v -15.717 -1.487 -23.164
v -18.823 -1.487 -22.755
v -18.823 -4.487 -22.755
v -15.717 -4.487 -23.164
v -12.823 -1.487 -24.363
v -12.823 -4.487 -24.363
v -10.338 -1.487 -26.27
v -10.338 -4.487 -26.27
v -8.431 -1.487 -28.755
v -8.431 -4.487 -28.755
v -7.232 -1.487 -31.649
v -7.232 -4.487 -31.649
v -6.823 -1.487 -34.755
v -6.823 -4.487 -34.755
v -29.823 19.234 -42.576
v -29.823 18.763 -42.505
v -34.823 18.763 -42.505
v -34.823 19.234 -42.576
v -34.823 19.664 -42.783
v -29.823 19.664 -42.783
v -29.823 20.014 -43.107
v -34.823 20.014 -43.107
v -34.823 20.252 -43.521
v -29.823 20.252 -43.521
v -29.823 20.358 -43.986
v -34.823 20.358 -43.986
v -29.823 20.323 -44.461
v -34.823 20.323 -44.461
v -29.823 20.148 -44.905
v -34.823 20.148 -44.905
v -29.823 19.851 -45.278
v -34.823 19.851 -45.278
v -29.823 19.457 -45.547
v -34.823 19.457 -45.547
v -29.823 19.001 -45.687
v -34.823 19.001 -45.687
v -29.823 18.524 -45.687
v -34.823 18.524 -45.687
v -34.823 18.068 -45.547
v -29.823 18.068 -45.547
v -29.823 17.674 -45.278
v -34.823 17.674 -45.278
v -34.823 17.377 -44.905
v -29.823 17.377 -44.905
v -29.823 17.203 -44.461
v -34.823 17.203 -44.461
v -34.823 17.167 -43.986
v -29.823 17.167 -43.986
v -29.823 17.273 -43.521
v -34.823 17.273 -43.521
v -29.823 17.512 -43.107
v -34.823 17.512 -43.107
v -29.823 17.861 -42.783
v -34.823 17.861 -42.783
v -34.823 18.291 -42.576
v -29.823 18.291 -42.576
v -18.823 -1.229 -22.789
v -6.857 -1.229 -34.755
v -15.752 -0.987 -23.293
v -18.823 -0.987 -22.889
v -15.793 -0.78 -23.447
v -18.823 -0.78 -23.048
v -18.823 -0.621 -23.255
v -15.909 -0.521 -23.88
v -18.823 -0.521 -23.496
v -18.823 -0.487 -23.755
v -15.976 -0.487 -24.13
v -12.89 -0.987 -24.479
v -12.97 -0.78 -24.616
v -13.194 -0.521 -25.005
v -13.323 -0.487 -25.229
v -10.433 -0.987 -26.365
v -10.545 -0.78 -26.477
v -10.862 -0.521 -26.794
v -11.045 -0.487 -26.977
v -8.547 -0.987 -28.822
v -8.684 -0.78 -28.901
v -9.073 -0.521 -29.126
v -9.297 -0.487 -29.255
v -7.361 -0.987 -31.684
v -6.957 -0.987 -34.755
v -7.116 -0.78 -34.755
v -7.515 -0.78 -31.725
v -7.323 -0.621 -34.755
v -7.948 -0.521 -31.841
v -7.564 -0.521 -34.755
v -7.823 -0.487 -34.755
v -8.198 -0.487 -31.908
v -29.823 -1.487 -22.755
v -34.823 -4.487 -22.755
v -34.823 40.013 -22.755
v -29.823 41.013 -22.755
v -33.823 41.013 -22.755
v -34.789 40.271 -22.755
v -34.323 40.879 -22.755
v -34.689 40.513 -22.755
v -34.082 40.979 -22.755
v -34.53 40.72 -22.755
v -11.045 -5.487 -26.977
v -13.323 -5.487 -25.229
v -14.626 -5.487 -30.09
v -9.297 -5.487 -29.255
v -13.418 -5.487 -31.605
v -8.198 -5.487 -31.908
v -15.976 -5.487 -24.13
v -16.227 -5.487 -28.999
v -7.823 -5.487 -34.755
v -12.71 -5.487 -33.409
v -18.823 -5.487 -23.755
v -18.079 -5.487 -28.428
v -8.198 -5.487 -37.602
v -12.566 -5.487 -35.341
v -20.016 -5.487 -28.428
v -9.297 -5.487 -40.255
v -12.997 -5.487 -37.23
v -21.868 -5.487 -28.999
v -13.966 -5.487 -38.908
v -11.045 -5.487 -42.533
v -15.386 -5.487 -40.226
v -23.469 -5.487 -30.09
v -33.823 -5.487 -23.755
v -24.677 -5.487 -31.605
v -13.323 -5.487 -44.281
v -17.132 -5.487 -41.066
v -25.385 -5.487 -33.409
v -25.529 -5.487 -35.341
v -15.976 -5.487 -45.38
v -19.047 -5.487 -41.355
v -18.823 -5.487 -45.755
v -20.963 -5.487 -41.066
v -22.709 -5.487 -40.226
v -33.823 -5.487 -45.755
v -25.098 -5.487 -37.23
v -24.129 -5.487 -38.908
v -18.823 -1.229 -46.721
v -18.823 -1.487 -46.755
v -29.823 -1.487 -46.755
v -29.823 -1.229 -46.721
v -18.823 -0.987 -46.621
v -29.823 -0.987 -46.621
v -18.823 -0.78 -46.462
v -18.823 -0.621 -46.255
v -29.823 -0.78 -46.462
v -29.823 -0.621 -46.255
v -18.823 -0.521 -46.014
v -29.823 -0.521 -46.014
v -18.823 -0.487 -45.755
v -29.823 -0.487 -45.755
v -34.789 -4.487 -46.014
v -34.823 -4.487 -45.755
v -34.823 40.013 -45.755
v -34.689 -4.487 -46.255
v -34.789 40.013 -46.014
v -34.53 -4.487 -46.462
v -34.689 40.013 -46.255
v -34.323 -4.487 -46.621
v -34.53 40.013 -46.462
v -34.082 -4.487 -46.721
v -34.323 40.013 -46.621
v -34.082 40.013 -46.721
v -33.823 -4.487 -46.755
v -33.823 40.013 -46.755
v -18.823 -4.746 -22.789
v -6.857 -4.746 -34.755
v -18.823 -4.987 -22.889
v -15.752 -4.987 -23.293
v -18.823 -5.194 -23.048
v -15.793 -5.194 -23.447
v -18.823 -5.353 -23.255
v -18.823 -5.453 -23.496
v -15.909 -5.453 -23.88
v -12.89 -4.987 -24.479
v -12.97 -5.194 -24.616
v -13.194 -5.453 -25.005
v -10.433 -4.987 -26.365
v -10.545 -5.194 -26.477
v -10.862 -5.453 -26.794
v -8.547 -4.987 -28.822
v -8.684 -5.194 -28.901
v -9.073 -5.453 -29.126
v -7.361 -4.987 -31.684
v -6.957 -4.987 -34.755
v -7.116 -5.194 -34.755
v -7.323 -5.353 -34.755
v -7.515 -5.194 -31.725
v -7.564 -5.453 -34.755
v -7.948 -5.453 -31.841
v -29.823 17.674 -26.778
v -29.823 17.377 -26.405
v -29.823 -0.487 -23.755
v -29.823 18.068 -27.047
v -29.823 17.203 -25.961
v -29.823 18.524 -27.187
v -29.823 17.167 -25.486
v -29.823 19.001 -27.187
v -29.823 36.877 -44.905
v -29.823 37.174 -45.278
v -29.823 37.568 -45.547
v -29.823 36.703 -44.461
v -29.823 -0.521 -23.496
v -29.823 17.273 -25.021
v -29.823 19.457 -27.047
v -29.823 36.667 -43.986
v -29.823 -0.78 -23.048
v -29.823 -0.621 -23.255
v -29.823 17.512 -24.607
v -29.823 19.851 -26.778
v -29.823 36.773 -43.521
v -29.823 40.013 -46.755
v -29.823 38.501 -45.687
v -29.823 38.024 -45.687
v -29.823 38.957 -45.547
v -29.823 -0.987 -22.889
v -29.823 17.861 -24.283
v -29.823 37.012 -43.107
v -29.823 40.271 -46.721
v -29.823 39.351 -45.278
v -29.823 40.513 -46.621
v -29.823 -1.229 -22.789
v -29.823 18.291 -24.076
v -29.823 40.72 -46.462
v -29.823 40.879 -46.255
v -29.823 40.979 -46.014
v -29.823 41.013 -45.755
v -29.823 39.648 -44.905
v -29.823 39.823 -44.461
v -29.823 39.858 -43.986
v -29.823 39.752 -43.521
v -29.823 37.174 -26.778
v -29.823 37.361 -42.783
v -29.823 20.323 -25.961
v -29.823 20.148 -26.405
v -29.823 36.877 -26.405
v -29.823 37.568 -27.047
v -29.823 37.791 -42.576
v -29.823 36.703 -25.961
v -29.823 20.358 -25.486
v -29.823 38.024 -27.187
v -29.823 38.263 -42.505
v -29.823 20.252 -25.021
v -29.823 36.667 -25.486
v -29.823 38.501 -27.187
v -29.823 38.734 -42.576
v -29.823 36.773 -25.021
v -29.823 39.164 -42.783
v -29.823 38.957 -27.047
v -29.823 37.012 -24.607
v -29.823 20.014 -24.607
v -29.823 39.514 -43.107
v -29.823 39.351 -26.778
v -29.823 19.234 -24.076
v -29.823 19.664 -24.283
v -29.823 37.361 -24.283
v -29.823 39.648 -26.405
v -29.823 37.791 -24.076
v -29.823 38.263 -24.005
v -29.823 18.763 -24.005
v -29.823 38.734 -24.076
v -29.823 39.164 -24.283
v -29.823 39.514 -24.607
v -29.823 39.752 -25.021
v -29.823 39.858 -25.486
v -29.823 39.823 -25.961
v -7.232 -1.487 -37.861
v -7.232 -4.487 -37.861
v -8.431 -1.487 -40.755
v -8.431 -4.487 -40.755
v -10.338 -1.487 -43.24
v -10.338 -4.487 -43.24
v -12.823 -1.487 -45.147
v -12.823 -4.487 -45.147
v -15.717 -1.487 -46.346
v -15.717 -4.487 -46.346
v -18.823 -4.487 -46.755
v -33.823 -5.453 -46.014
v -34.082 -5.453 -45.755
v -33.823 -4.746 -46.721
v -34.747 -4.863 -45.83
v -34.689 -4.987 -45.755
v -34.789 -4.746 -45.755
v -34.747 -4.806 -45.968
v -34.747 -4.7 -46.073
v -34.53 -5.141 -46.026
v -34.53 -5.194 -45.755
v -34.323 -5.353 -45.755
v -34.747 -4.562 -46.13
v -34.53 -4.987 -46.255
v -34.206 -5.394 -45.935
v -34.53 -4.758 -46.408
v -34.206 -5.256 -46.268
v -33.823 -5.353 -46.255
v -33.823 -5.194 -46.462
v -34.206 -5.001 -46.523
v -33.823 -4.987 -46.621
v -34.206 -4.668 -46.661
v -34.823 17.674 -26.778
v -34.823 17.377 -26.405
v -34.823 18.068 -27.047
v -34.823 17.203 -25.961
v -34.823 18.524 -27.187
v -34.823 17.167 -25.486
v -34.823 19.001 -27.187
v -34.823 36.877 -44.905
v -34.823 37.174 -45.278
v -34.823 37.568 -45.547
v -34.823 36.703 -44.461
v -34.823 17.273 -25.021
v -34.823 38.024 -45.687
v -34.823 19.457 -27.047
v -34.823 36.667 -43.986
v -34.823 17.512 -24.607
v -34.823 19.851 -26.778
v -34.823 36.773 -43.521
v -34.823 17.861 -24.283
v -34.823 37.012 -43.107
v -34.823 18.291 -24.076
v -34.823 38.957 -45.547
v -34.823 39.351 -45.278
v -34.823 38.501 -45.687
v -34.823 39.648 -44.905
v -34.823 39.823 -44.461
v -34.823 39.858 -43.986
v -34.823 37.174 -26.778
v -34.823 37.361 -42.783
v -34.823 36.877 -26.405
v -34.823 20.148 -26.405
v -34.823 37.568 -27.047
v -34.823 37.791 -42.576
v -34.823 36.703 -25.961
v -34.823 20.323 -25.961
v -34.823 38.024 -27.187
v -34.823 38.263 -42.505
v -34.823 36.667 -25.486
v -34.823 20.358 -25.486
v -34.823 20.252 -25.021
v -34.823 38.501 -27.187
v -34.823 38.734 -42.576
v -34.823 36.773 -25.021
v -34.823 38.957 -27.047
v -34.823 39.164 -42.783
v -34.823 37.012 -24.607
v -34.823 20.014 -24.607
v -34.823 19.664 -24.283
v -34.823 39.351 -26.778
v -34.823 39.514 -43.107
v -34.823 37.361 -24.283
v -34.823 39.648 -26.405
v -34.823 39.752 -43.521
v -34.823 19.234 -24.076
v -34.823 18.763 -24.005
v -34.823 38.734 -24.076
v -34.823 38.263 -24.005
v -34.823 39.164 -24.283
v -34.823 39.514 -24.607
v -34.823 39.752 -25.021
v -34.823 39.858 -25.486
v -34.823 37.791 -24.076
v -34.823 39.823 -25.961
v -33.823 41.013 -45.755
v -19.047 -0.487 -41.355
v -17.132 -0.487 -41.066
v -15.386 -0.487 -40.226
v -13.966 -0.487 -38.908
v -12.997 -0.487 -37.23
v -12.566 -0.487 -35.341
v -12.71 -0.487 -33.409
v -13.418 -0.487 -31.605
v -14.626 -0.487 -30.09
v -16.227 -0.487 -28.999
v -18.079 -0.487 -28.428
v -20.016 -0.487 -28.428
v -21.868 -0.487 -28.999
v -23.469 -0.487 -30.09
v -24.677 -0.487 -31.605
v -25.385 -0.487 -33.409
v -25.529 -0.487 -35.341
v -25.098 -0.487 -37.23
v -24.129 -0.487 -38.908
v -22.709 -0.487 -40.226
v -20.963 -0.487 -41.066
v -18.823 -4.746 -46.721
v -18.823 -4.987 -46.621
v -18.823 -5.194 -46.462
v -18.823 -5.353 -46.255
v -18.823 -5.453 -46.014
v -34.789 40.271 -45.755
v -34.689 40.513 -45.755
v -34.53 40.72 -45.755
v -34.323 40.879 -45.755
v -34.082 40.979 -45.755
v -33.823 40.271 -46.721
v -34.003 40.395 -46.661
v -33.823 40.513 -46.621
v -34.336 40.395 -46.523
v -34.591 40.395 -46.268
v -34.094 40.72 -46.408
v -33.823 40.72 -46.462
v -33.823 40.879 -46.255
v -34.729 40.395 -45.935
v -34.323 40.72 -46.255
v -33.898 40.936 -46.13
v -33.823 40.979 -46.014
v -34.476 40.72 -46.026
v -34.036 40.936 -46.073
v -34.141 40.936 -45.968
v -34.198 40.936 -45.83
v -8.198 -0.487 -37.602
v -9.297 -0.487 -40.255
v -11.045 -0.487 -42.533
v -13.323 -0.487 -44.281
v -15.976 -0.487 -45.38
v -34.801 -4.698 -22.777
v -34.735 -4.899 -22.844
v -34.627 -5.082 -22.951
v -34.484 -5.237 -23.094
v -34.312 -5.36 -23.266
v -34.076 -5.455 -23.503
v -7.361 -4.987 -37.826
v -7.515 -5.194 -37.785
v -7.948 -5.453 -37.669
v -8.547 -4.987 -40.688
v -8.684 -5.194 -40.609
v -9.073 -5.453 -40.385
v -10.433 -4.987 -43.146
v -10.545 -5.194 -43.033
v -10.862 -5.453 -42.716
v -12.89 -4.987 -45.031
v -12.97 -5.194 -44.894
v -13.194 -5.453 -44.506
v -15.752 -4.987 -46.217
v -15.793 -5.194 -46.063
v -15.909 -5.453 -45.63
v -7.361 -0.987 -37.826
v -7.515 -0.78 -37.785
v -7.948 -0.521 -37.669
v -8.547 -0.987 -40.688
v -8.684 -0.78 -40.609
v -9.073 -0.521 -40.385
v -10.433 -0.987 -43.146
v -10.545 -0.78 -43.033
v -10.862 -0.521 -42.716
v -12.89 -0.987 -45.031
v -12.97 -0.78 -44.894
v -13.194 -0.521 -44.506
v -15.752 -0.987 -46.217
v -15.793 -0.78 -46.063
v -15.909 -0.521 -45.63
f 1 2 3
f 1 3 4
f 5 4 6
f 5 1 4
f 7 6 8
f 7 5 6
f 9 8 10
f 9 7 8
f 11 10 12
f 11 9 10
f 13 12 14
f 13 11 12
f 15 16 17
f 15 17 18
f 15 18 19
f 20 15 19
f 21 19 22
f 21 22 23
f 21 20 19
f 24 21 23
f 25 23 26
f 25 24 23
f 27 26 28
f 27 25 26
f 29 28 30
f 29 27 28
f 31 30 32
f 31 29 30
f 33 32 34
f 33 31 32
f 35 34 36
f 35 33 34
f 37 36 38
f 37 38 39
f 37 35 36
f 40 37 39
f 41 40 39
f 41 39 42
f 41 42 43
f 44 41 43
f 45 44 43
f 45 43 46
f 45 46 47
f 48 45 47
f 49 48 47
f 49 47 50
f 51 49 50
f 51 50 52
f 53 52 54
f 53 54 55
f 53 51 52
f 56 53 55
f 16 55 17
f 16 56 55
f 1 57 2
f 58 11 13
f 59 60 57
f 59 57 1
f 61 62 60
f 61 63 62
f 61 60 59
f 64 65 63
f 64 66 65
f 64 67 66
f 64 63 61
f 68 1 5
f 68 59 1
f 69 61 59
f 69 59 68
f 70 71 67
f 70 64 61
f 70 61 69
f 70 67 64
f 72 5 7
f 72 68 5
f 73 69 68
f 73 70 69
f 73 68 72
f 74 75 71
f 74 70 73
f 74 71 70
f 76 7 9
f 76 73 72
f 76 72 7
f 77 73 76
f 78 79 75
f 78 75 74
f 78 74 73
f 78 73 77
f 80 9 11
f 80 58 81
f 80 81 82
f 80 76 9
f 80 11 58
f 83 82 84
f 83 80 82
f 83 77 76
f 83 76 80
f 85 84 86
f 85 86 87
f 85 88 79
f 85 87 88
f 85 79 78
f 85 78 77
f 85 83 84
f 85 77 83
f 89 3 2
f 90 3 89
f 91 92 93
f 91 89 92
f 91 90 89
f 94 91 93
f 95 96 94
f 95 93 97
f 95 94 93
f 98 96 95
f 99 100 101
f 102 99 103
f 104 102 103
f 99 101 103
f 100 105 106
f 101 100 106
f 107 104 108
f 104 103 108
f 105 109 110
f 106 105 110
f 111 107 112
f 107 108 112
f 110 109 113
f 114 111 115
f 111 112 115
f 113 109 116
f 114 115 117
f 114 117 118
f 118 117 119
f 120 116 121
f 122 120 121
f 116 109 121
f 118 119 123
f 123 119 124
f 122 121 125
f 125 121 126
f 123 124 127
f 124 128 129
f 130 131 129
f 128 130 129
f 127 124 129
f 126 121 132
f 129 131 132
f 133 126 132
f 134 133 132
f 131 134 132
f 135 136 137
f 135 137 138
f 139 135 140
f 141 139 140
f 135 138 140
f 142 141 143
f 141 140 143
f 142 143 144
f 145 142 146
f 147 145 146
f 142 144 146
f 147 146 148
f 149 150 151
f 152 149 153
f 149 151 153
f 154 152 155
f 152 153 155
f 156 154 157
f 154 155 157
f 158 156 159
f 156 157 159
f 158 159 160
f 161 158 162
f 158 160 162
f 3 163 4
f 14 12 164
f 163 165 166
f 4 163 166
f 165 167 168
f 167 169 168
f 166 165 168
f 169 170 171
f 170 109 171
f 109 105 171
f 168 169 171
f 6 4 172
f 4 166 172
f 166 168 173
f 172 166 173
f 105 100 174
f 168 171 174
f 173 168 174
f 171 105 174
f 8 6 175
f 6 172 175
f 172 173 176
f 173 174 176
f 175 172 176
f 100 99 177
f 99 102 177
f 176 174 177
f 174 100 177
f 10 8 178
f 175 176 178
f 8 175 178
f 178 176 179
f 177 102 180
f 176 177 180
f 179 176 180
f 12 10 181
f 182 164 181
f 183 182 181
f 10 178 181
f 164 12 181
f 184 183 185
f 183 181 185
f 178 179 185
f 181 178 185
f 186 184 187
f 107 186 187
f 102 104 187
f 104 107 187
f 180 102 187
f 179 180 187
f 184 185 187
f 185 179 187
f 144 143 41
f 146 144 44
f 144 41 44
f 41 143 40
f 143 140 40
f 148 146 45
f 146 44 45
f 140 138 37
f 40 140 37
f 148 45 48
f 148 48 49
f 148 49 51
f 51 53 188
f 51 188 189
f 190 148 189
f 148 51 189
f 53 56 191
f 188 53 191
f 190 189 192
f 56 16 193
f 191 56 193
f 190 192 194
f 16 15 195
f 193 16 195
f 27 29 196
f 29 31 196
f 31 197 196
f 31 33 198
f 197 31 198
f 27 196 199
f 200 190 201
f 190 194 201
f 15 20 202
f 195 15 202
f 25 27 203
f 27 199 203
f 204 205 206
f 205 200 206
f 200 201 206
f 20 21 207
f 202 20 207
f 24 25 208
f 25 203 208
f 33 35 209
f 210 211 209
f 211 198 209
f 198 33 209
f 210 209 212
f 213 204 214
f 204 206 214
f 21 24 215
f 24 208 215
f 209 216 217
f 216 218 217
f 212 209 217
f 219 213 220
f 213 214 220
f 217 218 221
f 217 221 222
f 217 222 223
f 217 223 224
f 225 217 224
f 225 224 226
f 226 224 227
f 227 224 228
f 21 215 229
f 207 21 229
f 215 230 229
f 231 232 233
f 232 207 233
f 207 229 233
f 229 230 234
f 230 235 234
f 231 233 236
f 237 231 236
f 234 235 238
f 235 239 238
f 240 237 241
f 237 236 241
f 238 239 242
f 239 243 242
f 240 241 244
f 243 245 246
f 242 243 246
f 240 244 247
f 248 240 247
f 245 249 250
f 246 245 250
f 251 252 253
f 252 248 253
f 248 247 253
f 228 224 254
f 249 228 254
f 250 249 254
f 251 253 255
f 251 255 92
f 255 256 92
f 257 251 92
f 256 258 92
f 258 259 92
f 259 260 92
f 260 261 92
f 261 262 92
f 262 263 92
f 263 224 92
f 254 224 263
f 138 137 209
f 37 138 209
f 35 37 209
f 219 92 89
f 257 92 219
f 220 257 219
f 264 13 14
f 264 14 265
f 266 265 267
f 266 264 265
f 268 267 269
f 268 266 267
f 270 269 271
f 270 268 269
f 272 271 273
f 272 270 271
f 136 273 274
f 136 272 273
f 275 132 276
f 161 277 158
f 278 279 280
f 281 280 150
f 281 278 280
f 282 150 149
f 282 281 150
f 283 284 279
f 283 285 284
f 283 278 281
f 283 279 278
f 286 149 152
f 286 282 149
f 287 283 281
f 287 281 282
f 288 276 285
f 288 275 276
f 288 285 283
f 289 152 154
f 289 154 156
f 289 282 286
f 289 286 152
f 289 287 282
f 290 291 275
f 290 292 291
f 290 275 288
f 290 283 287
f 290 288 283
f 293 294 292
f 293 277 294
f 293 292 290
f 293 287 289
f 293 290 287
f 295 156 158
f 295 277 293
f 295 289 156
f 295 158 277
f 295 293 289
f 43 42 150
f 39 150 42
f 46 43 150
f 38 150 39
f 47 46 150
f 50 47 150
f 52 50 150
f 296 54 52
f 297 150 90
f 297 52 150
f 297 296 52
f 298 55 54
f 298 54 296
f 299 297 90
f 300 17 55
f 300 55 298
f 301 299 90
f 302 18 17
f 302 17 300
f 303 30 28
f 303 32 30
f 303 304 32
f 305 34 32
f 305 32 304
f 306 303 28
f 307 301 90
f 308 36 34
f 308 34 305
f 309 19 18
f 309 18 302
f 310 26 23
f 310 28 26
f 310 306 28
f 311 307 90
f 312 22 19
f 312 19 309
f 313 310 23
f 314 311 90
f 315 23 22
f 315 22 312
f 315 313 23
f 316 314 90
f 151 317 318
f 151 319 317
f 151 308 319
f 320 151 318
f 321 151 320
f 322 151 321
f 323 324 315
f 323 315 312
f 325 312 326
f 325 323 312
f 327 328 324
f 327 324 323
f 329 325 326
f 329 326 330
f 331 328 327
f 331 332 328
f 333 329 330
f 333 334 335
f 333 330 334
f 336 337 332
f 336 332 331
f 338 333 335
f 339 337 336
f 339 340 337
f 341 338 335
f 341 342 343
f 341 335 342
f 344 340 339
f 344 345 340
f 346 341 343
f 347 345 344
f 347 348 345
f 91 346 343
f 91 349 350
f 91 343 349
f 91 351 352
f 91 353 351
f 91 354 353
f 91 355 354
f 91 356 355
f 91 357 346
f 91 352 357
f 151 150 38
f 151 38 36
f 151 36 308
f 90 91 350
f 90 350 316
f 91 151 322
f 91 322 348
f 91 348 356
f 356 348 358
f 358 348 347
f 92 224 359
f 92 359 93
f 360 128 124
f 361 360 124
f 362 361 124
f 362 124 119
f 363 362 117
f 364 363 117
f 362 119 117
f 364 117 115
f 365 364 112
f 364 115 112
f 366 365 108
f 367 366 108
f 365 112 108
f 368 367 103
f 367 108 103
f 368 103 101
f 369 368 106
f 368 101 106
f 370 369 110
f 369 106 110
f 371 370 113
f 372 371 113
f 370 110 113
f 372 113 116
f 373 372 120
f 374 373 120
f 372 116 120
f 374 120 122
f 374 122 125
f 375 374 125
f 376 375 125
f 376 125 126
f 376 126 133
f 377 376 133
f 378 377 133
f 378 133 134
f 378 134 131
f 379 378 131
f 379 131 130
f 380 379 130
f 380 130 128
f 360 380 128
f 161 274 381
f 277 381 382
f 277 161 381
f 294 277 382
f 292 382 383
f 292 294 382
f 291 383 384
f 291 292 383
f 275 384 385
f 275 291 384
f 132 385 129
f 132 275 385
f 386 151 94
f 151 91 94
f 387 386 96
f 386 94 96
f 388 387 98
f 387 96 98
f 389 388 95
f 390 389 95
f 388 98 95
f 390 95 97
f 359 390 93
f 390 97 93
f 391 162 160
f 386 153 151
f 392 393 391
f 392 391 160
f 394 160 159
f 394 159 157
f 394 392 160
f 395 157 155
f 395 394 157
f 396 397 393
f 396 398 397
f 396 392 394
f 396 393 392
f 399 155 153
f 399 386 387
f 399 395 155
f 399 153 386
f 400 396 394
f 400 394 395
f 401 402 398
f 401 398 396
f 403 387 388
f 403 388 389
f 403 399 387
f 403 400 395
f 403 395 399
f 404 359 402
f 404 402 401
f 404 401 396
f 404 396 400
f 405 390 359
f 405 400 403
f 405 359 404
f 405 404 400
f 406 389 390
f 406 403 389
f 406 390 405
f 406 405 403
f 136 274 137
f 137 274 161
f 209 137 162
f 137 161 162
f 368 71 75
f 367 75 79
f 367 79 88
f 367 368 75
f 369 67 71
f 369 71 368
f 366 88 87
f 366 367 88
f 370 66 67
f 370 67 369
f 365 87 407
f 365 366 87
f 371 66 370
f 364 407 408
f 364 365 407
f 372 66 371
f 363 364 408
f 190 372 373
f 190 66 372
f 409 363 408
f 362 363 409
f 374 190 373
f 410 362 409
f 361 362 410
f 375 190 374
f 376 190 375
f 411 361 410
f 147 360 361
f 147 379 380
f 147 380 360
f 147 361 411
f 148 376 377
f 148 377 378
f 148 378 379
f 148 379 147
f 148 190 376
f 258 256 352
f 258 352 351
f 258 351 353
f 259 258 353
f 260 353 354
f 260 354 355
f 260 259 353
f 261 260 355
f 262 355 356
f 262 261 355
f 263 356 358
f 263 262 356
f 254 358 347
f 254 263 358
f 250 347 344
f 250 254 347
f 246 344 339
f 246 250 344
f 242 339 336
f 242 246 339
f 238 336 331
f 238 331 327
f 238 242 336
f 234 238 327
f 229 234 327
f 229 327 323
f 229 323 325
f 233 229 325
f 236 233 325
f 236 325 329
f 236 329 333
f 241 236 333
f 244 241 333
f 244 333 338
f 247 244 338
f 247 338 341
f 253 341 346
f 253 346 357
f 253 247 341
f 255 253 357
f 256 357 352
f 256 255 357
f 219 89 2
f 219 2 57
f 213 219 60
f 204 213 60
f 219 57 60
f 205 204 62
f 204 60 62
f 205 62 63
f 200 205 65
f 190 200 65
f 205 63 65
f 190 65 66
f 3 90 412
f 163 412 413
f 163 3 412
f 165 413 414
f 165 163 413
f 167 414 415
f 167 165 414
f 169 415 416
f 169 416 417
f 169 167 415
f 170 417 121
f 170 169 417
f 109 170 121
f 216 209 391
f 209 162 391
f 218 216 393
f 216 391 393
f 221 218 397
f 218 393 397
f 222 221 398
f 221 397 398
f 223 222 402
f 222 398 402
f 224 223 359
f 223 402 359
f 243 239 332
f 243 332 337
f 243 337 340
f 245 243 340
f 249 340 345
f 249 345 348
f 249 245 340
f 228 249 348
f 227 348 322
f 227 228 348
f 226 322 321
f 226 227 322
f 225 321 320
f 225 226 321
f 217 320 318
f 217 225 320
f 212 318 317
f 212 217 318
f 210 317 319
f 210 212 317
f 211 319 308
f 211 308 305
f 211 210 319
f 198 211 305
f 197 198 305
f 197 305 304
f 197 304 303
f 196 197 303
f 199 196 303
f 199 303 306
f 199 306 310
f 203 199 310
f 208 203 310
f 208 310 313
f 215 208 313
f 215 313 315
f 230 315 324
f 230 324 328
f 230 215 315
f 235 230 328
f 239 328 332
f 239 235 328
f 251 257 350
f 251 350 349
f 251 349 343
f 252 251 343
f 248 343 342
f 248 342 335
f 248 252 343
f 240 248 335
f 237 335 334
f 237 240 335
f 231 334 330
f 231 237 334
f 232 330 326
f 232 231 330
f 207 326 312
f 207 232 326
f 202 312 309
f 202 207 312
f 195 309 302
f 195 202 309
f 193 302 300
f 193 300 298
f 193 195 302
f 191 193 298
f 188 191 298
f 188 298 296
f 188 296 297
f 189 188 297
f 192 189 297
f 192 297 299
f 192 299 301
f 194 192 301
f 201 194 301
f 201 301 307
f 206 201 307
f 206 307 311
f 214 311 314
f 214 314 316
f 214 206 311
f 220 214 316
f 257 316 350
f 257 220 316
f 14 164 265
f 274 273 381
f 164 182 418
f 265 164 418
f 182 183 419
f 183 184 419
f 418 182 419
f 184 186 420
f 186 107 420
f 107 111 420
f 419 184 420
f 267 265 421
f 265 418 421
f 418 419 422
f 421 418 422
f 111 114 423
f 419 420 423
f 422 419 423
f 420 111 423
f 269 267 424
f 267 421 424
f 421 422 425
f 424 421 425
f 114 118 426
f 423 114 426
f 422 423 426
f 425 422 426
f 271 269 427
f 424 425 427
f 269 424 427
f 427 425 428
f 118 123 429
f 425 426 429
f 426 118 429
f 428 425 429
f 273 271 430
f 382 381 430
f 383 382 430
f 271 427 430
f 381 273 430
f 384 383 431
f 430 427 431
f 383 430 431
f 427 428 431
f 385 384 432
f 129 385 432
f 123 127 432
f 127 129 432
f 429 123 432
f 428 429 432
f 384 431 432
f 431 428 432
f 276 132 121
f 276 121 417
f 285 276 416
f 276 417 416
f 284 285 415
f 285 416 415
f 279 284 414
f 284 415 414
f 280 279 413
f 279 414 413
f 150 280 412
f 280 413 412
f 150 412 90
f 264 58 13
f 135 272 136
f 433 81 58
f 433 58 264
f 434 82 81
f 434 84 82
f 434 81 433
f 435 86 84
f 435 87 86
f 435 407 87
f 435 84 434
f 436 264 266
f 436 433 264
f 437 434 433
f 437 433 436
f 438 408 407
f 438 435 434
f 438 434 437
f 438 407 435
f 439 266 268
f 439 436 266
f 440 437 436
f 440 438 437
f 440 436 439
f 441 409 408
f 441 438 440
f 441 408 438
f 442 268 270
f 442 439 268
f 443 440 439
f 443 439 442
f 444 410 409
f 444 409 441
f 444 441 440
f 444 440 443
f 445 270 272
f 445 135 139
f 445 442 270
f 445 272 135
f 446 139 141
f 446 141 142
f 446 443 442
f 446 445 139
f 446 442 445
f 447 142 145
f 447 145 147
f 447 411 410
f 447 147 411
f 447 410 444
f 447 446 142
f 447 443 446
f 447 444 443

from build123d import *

# Parameters (mm, degrees)
CROQUIS1_W              = 24
CROQUIS1_H              = 46.5
CROQUIS1_R              = 1.6
SALIENTE_EXTRUIR1_DEPTH = 5
CROQUIS2_W              = 24
CROQUIS2_H              = 5
SALIENTE_EXTRUIR2_DEPTH = 23
CORTAR_EXTRUIR1_REACH   = 76.572
CROQUIS3_R              = 6.5
REDONDEO1_R             = 12
REDONDEO2_R             = 1
REDONDEO3_R             = 1


with BuildPart() as part:
    # Croquis1 → Saliente-Extruir1 (new body)
    with BuildSketch(Plane.ZY.offset(29.823119035)):
        with Locations((-34.755083615, 17.762616936)):
            Rectangle(CROQUIS1_W, CROQUIS1_H)
        with Locations((-44.105083615, 38.262616936)):
            Circle(CROQUIS1_R, mode=Mode.SUBTRACT)
        with Locations((-25.605083615, 38.262616936)):
            Circle(CROQUIS1_R, mode=Mode.SUBTRACT)
        with Locations((-25.605083615, 18.762616936)):
            Circle(CROQUIS1_R, mode=Mode.SUBTRACT)
        with Locations((-44.105083615, 18.762616936)):
            Circle(CROQUIS1_R, mode=Mode.SUBTRACT)
    extrude(amount=SALIENTE_EXTRUIR1_DEPTH)

    # Croquis2 → Saliente-Extruir2 (add)
    with BuildSketch(Plane(origin=(-29.823119035, 0, 0), x_dir=(0, 0, -1), z_dir=(1, 0, 0))):
        with Locations((34.755083615, -2.987383064)):
            Rectangle(CROQUIS2_W, CROQUIS2_H)
    extrude(amount=SALIENTE_EXTRUIR2_DEPTH)

    # Croquis3 → Cortar-Extruir1 (cut, up to next)
    with BuildSketch(Plane.XZ.offset(5.487383064), mode=Mode.PRIVATE) as cortar_extruir1_sk1:
        with Locations(Location((-19.047480384, -34.855083615, 0), (0, 0, 270))):
            Circle(CROQUIS3_R)
    cortar_extruir1_tool1 = extrude(cortar_extruir1_sk1.sketch, amount=-CORTAR_EXTRUIR1_REACH, mode=Mode.PRIVATE) & part.part
    add(cortar_extruir1_tool1.solids().sort_by_distance((-19.04748, -5.487383, -34.855084))[0], mode=Mode.SUBTRACT)

    # Redondeo1
    redondeo1_edges = [part.edges().sort_by_distance(p)[0] for p in [
        (-6.823119035, -2.987383064, -22.755083615),
        (-6.823119035, -2.987383064, -46.755083615),
    ]]
    fillet(redondeo1_edges, radius=REDONDEO1_R - 0.0001)  # a hair under: the kernel refuses the full size

    # Redondeo2
    redondeo2_edges = [part.edges().sort_by_distance(p)[0] for p in [
        (-26.823069035, -5.487383064, -22.755083615),
        (-10.337808371, -5.487383064, -26.269772952),
        (-10.337808371, -5.487383064, -43.240394279),
        (-24.323069035, -0.487383064, -22.755083615),
        (-10.337808371, -0.487383064, -26.269772952),
        (-10.337808371, -0.487383064, -43.240394279),
        (-34.823119035, -5.487383064, -34.755083615),
        (-34.823119035, 17.762616936, -46.755083615),
        (-26.823069035, -5.487383064, -46.755083615),
        (-24.323069035, -0.487383064, -46.755083615),
    ]]
    fillet(redondeo2_edges, radius=REDONDEO2_R)

    # Redondeo3
    redondeo3_edges = [part.edges().sort_by_distance(p)[0] for p in [
        (-31.823119035, 41.012616936, -46.755083615),
        (-34.823119035, 41.012616936, -34.255083615),
    ]]
    fillet(redondeo3_edges, radius=REDONDEO3_R)


solid = part.part
